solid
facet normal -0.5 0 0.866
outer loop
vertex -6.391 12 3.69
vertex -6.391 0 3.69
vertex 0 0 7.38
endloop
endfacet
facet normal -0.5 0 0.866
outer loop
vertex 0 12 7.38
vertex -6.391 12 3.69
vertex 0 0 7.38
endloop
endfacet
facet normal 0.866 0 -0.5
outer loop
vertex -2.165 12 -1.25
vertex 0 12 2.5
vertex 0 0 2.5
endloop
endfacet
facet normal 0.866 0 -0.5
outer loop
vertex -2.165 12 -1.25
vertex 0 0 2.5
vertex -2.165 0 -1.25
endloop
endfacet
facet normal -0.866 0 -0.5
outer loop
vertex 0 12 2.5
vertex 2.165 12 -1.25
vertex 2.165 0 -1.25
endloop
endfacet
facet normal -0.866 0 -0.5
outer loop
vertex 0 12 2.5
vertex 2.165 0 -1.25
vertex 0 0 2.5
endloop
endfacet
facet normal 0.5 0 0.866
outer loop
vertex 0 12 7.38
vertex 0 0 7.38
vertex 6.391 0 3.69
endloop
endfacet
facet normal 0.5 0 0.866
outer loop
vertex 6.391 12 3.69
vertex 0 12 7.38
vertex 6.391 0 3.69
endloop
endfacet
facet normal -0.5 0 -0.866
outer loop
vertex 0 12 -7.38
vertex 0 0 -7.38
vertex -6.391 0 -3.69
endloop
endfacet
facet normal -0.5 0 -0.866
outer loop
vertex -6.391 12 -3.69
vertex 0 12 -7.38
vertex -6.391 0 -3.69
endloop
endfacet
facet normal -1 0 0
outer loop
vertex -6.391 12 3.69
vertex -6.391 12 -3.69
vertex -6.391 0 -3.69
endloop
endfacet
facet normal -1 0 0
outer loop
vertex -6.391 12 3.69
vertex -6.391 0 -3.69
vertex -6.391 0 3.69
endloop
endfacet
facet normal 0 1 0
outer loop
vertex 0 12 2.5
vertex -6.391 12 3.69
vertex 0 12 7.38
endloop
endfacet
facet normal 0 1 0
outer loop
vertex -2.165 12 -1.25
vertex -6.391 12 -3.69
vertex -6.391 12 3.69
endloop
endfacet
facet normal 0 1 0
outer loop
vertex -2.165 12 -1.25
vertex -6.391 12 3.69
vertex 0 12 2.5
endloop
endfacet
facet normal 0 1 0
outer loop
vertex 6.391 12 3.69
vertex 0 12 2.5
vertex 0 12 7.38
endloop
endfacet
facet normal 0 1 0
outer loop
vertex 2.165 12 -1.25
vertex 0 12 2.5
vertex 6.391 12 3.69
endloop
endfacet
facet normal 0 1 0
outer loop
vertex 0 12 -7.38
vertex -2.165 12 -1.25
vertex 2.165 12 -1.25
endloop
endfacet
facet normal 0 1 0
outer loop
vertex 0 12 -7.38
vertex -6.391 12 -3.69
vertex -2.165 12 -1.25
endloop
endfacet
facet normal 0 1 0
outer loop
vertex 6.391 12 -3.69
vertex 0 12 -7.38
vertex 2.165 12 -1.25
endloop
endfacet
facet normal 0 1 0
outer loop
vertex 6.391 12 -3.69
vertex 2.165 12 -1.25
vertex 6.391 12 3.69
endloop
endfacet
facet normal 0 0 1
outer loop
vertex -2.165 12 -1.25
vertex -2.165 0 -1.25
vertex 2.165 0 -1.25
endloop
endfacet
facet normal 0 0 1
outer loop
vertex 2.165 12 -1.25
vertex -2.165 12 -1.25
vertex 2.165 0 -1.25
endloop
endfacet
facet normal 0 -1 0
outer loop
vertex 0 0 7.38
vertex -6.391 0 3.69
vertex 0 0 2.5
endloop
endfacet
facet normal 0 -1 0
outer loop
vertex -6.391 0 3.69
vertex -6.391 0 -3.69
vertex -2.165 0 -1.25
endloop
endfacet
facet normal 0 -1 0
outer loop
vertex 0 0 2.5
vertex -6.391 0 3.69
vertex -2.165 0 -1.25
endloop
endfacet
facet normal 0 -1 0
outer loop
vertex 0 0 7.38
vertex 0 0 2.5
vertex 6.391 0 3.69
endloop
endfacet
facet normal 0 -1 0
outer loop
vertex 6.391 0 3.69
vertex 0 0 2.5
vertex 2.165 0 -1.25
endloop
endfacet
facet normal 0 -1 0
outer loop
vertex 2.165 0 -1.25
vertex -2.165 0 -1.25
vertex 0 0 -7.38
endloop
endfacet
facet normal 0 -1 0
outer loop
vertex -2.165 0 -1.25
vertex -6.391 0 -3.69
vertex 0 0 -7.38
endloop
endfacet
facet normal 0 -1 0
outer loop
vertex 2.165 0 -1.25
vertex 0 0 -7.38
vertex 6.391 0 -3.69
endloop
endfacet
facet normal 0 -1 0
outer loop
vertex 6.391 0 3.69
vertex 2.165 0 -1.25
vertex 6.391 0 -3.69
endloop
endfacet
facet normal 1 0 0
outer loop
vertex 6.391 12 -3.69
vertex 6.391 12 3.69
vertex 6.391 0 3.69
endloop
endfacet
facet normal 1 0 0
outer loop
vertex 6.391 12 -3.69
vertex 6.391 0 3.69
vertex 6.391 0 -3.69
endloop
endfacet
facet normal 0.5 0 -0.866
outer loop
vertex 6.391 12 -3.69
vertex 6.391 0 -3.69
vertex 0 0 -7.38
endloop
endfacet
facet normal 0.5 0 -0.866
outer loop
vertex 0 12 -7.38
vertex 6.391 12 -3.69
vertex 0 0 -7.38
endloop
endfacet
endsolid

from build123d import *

# Parameters (mm, degrees)
BOSS_EXTRUDE1_DEPTH = 12
CUT_EXTRUDE1_DEPTH  = 20


with BuildPart() as part:
    # Sketch1 → Boss-Extrude1 (new body)
    with BuildSketch(Plane(origin=(0, 0, 0), x_dir=(1, 0, 0), z_dir=(0, 1, 0))):
        Polygon((0, 7.38), (-6.39126748, 3.69), (-6.39126748, -3.69), (0, -7.38), (6.39126748, -3.69), (6.39126748, 3.69), align=None)
    extrude(amount=BOSS_EXTRUDE1_DEPTH)

    # Sketch2 → Cut-Extrude1 (cut)
    with BuildSketch(Plane.XZ):
        Polygon((-2.165063509, -1.25), (2.165063509, -1.25), (0, 2.5), align=None)
    extrude(amount=-CUT_EXTRUDE1_DEPTH, mode=Mode.SUBTRACT)


solid = part.part
